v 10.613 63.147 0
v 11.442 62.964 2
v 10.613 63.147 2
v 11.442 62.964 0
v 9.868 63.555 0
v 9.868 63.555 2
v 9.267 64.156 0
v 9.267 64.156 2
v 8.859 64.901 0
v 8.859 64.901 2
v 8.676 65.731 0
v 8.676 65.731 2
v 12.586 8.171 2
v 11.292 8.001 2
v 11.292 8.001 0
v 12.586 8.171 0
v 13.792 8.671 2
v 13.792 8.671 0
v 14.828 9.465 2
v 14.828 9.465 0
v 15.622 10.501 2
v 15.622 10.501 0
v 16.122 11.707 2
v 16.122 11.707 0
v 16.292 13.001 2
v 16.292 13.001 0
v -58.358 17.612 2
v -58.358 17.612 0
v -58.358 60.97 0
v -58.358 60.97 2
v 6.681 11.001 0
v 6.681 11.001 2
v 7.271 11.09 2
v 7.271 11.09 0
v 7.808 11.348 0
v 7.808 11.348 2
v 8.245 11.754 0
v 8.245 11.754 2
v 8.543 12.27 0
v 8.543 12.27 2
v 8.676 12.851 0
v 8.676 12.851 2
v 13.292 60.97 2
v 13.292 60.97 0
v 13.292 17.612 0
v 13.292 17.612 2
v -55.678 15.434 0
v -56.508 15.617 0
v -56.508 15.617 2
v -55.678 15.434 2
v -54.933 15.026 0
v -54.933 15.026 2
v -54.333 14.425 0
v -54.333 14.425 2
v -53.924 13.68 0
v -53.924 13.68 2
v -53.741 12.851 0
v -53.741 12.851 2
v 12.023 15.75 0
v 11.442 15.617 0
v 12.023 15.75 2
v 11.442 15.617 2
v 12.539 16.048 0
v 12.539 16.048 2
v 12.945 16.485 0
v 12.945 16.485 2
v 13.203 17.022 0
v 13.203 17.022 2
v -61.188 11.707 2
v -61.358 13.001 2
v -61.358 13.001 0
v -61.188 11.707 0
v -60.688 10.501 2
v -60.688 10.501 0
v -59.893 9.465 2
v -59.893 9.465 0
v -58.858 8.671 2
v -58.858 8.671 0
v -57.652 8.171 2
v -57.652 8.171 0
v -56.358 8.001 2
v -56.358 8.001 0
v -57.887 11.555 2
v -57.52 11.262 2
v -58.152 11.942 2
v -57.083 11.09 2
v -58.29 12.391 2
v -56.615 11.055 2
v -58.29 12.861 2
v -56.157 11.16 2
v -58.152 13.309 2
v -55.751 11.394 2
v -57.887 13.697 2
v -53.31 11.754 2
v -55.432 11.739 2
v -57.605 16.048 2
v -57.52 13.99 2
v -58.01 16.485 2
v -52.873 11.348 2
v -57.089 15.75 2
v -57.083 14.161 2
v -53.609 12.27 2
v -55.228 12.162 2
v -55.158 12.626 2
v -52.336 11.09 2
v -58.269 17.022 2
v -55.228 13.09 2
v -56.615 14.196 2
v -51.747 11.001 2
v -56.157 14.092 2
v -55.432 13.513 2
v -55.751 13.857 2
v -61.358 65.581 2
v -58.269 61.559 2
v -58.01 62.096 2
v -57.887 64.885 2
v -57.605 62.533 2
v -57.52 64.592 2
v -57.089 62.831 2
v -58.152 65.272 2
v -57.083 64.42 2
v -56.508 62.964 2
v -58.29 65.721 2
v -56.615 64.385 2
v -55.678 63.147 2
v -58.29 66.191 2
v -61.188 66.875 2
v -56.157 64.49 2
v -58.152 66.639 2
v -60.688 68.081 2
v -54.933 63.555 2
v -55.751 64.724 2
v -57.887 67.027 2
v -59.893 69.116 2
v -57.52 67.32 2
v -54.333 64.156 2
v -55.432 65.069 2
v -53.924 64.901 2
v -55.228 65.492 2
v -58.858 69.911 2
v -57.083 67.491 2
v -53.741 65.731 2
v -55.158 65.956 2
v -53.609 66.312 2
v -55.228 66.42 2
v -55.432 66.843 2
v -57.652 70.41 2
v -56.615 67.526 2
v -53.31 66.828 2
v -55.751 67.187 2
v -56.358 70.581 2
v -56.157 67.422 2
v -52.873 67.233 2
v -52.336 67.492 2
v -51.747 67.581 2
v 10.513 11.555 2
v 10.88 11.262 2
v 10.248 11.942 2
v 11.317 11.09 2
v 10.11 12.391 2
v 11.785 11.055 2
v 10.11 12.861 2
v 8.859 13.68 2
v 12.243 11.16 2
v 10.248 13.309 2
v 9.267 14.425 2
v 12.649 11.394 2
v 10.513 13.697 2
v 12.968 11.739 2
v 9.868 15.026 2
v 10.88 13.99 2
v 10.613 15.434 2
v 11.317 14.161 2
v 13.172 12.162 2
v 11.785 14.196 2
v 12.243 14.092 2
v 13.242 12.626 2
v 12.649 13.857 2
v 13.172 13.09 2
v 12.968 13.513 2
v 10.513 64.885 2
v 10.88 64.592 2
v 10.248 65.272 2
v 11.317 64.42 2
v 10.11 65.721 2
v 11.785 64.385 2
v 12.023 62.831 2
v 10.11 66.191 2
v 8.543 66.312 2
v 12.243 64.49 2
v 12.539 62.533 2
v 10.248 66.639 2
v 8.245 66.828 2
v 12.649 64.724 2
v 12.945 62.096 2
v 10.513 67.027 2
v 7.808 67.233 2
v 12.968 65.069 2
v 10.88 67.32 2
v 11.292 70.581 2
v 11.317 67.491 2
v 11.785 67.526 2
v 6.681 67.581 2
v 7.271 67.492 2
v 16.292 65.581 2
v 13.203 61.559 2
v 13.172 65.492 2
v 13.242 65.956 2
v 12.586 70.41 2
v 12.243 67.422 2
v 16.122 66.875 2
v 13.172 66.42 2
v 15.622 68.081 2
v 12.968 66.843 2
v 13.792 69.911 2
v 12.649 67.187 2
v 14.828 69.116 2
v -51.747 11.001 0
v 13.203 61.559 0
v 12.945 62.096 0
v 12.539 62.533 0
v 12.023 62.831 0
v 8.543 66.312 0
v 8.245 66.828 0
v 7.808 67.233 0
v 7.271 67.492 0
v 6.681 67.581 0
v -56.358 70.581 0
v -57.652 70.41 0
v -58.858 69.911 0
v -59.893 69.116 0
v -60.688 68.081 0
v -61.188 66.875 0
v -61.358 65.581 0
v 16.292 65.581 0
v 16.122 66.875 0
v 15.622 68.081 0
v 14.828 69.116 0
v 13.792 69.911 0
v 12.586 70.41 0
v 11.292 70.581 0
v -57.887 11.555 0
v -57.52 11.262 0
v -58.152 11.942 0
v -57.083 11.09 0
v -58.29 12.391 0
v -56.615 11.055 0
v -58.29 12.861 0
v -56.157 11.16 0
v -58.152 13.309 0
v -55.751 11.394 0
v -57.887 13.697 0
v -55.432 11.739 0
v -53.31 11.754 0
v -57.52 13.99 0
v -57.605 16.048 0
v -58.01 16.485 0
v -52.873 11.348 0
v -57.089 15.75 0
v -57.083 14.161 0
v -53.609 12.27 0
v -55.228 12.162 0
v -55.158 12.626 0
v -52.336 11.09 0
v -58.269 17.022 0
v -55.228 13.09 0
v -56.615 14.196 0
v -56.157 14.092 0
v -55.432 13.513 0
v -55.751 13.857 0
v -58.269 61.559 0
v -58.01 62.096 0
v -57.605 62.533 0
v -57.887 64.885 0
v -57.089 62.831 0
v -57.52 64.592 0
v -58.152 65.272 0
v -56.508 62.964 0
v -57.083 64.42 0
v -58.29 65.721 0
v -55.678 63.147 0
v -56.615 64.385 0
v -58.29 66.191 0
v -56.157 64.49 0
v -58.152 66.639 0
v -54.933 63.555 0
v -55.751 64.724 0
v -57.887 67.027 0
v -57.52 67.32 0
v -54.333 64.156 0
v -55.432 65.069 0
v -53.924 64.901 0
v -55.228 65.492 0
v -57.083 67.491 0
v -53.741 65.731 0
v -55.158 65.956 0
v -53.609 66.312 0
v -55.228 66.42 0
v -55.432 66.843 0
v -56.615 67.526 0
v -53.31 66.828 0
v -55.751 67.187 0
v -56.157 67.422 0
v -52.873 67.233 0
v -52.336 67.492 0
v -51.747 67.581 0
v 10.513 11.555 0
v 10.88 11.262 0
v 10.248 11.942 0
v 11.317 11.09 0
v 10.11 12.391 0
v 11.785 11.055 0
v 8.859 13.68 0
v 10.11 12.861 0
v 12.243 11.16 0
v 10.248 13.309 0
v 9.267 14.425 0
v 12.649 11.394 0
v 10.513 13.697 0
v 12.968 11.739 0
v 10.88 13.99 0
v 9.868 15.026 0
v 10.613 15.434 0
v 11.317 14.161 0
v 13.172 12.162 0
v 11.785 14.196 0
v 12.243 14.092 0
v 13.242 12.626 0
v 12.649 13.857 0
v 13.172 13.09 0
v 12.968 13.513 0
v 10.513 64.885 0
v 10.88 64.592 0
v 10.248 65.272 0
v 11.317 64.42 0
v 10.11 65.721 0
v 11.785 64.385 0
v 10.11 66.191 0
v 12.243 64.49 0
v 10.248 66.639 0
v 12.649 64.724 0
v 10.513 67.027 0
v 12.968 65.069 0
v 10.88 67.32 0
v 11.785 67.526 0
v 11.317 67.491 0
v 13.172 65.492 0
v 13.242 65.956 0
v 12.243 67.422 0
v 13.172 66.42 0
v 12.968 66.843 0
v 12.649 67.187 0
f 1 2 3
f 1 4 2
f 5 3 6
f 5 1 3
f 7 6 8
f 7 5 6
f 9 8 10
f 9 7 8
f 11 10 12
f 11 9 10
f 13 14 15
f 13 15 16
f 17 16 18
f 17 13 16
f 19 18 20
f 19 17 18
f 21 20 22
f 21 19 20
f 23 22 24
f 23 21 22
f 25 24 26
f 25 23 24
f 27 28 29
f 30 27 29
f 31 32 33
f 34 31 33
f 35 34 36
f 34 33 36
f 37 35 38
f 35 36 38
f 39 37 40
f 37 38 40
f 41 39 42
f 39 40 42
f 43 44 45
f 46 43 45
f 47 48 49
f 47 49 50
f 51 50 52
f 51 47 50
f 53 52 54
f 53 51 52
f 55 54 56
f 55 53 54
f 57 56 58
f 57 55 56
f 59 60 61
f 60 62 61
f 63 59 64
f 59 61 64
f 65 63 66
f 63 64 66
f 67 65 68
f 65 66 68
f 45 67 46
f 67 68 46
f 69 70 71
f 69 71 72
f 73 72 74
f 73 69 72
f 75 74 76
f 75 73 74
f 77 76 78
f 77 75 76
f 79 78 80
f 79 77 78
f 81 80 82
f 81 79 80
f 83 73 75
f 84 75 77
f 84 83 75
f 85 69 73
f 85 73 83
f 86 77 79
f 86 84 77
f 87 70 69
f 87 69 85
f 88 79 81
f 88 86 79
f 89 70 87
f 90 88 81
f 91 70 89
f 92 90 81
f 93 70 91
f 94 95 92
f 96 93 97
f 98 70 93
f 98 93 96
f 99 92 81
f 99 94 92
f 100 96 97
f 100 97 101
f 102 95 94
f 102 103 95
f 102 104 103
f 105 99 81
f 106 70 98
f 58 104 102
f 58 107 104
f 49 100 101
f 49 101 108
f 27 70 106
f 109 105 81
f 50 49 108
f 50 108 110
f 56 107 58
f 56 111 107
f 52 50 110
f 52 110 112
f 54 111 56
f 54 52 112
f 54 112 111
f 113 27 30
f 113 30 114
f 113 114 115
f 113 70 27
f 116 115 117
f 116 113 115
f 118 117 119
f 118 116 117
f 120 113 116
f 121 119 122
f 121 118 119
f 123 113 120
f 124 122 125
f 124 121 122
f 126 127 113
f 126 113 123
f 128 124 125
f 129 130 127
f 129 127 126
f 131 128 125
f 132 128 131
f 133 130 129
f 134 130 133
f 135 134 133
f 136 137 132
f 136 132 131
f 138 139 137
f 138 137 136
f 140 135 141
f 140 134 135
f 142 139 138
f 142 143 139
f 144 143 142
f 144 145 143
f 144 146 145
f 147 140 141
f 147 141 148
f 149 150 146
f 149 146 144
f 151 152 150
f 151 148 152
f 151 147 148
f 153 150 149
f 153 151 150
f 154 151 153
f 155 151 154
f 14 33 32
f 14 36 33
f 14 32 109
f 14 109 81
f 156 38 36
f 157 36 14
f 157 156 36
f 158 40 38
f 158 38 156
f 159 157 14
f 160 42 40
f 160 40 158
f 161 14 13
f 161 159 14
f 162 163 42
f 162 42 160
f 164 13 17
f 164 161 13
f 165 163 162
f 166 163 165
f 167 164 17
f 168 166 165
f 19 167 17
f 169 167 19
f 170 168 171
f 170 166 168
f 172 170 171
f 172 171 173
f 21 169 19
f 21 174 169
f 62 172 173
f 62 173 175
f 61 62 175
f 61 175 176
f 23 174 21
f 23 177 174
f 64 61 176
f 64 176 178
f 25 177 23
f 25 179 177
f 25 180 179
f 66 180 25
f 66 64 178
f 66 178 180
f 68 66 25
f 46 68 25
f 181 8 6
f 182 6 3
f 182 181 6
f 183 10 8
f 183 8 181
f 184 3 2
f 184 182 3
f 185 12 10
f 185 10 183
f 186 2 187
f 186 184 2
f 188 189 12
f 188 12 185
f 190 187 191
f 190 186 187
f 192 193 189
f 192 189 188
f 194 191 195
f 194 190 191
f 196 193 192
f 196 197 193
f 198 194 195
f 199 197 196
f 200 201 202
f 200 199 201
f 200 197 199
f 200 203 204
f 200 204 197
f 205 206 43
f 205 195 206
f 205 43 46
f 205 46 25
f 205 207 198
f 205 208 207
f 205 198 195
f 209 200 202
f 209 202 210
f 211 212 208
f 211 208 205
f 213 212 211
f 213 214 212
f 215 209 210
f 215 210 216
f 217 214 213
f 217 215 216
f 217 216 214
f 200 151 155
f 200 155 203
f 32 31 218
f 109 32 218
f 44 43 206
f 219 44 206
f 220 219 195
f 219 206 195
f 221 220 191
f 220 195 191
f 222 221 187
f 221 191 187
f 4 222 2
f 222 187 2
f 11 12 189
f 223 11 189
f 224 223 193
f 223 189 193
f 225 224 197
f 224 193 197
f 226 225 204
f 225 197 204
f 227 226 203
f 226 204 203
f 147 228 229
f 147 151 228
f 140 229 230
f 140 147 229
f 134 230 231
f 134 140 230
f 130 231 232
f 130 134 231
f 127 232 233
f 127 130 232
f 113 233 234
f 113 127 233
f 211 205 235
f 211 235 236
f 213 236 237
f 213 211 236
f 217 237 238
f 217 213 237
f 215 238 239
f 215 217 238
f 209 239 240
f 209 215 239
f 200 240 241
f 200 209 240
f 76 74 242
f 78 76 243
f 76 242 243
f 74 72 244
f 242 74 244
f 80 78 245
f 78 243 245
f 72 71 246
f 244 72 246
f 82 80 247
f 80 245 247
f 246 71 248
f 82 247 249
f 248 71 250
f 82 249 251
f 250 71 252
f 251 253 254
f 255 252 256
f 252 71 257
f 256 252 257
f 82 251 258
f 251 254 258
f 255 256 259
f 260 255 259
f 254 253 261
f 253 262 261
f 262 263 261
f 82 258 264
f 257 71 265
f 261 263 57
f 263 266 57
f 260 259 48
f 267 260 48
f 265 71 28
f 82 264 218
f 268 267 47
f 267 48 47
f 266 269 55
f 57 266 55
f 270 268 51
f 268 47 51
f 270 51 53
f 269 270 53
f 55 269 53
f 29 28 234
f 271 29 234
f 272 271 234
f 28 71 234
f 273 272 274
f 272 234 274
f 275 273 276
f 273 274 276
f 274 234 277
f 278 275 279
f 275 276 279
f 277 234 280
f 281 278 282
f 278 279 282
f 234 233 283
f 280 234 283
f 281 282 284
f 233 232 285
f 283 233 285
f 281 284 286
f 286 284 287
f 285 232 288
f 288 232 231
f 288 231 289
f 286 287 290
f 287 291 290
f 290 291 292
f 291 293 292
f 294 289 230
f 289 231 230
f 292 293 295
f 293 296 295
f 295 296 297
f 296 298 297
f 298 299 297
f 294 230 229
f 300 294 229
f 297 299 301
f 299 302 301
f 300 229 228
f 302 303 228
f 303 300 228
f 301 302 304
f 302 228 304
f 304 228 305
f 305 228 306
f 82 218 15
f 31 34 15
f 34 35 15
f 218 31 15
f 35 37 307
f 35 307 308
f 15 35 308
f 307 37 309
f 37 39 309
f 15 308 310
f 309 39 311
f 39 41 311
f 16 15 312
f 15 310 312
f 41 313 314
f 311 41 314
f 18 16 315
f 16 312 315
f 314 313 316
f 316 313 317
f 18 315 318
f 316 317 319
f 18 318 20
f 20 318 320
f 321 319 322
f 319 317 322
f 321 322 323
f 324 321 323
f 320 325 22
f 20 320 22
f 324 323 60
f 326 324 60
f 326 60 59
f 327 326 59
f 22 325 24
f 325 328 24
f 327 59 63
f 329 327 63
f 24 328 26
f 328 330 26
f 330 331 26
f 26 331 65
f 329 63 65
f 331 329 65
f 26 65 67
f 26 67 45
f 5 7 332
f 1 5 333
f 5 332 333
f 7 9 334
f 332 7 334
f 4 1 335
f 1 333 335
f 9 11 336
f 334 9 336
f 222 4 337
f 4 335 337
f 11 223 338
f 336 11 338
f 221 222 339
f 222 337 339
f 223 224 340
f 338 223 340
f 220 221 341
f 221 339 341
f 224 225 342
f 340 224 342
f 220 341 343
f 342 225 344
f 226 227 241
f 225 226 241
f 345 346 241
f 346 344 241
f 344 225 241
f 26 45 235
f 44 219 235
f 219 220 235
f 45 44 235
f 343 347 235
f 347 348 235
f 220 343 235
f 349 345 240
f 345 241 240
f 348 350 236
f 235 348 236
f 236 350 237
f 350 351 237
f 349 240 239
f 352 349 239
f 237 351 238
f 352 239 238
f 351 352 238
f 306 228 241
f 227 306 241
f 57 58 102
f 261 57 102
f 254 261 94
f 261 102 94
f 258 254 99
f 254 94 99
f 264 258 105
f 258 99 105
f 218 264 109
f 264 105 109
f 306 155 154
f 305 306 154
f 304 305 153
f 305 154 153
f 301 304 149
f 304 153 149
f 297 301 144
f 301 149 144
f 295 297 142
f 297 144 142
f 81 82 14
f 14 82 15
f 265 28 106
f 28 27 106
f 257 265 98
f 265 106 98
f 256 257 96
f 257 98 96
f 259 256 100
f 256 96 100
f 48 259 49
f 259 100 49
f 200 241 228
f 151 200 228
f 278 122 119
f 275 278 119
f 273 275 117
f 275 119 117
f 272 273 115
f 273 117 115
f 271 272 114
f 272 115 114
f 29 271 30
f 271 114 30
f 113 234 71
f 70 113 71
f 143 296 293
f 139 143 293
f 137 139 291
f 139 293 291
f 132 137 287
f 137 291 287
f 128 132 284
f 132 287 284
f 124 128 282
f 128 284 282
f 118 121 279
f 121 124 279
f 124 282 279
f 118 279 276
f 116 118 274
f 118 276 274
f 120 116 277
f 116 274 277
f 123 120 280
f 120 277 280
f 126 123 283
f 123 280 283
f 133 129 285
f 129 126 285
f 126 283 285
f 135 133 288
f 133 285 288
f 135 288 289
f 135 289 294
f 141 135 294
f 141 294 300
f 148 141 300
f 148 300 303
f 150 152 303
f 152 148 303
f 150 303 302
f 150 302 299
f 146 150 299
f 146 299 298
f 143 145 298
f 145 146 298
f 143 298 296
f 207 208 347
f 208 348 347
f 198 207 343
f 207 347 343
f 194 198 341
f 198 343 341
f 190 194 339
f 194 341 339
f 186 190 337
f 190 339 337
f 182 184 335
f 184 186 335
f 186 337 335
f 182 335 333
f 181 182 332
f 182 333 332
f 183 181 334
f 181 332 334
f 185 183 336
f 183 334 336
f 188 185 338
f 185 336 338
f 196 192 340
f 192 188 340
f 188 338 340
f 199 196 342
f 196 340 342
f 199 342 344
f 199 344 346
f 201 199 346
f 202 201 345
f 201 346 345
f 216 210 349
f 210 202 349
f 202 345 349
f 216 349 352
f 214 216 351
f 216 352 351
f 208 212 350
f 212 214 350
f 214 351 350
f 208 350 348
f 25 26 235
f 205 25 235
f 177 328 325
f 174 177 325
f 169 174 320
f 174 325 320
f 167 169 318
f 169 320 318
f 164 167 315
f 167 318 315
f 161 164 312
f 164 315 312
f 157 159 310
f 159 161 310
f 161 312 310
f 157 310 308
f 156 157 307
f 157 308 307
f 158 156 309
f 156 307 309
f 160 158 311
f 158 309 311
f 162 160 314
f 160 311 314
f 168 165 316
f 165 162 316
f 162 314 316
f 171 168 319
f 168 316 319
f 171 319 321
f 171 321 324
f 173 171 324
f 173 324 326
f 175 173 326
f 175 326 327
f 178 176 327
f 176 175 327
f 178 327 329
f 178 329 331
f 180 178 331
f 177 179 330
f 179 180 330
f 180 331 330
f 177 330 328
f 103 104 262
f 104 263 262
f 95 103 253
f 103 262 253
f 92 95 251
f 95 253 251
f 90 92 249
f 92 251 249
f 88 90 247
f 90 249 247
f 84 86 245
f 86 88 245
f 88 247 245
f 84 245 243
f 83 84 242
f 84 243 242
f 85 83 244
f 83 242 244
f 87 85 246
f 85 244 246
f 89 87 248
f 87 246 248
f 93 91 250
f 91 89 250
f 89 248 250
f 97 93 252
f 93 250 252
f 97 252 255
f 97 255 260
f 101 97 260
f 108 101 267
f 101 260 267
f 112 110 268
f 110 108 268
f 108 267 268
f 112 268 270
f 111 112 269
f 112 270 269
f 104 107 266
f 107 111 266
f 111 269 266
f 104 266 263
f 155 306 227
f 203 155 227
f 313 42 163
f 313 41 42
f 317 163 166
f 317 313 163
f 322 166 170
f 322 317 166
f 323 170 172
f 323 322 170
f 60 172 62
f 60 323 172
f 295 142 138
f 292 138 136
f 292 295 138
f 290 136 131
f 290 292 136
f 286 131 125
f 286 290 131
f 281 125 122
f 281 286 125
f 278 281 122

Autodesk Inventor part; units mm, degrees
ref_plane "YZ Plane" through (0, 0, 0) normal (1, 0, 0) x (0, 1, 0)
ref_plane "XZ Plane" through (0, 0, 0) normal (0, 1, 0) x (-1, 0, 0)
ref_plane "XY Plane" through (0, 0, 0) normal (0, 0, 1) x (1, 0, 0)
sketch "card+border" plane through (0, 0, 0) normal (0, 0, 1) x (1, 0, 0)
  line L0 (-59.3579, 68.5808) -> (-59.3579, 10.0008)
  line L1 (-59.3579, 10.0008) -> (14.2921, 10.0008)
  line L2 (14.2921, 10.0008) -> (14.2921, 68.5808)
  line L3 (14.2921, 68.5808) -> (-59.3579, 68.5808)
  circle A0 centre (11.6671, 65.9558) radius 1.575
  circle A1 centre (11.6671, 12.6258) radius 1.575
  circle A2 centre (-56.7329, 65.9558) radius 1.575
  circle A3 centre (-56.7329, 12.6258) radius 1.575
  line L4 (-61.3579, 70.5808) -> (-61.3579, 8.0008)
  line L5 (-61.3579, 8.0008) -> (16.2921, 8.0008)
  line L6 (16.2921, 8.0008) -> (16.2921, 70.5808)
  line L7 (16.2921, 70.5808) -> (-61.3579, 70.5808)
  line L8 (-58.3579, 67.5808) -> (13.2921, 67.5808)
  line L9 (13.2921, 67.5808) -> (13.2921, 11.0008)
  line L10 (13.2921, 11.0008) -> (-58.3579, 11.0008)
  line L11 (-58.3579, 11.0008) -> (-58.3579, 67.5808)
  circle A4 centre (-56.7329, 65.9558) radius 3
  circle A5 centre (11.6671, 65.9558) radius 3
  circle A6 centre (11.6671, 12.6258) radius 3
  circle A7 centre (-56.7329, 12.6258) radius 3
  point P0 (0, 0)
  point P1 (-54.2111, 67.5808)
  point P2 (9.1454, 67.5808)
  point P3 (13.2921, 63.434)
  point P4 (13.2921, 15.1475)
  point P5 (9.1454, 11.0008)
  point P6 (-54.2111, 11.0008)
  point P7 (-58.3579, 15.1475)
  point P8 (-58.3579, 63.434)
  dimension "d1" = 58.58
  dimension "d2" = 73.65
  dimension "d4" = 2.625
  dimension "d5" = 3.15
  dimension "d31" = 2.625
  dimension "d32" = 2.625
  dimension "d33" = 2.625
  dimension "d34" = 3.15
  dimension "d35" = 2
  dimension "d36" = 3
  dimension "d37" = 3
  dimension "d38" = 3
  dimension "d39" = 3
  dimension "d40" = 6
  dimension "d41" = 6
  dimension "d42" = 6
  dimension "d43" = 6
extrude "Middle wall" add sketch "card+border" along normal blind 2 contours L3 A4 L0 | A4 L3 L8 L11 L0 | L0 A4 | A4 L3 | A4 L11 A7 L0 | L3 A5 L8 A4 | A7 L11 L10 L1 L0 | L0 A7 | L11 L8 A4 | A5 L3 | L3 A5 L2 L9 L8 | A7 L1 L0 | A7 L10 L11 | L3 L2 A5 | L8 L9 A5 | L1 A7 | A5 L2 | A5 L2 A6 L9 | A7 L10 A6 L1 | A6 L2 L1 L10 L9 | L9 L10 A6 | L1 A6 | A6 L2 | A6 L2 L1 | L7 L6 L5 L4
fillet "Skruehull suport" radius 2 8 edges at (9.1454, 67.5808, 1) (13.2921, 63.434, 1) (-58.3579, 63.434, 1) (-54.2111, 67.5808, 1) (-54.2111, 11.0008, 1) (-58.3579, 15.1475, 1) (13.2921, 15.1475, 1) (9.1454, 11.0008, 1)
fillet "Kantutjevning" radius 5 4 edges at (16.2921, 70.5808, 1) (-61.3579, 70.5808, 1) (-61.3579, 8.0008, 1) (16.2921, 8.0008, 1)
properties part number "Trippeldekker_Midtre plate"
